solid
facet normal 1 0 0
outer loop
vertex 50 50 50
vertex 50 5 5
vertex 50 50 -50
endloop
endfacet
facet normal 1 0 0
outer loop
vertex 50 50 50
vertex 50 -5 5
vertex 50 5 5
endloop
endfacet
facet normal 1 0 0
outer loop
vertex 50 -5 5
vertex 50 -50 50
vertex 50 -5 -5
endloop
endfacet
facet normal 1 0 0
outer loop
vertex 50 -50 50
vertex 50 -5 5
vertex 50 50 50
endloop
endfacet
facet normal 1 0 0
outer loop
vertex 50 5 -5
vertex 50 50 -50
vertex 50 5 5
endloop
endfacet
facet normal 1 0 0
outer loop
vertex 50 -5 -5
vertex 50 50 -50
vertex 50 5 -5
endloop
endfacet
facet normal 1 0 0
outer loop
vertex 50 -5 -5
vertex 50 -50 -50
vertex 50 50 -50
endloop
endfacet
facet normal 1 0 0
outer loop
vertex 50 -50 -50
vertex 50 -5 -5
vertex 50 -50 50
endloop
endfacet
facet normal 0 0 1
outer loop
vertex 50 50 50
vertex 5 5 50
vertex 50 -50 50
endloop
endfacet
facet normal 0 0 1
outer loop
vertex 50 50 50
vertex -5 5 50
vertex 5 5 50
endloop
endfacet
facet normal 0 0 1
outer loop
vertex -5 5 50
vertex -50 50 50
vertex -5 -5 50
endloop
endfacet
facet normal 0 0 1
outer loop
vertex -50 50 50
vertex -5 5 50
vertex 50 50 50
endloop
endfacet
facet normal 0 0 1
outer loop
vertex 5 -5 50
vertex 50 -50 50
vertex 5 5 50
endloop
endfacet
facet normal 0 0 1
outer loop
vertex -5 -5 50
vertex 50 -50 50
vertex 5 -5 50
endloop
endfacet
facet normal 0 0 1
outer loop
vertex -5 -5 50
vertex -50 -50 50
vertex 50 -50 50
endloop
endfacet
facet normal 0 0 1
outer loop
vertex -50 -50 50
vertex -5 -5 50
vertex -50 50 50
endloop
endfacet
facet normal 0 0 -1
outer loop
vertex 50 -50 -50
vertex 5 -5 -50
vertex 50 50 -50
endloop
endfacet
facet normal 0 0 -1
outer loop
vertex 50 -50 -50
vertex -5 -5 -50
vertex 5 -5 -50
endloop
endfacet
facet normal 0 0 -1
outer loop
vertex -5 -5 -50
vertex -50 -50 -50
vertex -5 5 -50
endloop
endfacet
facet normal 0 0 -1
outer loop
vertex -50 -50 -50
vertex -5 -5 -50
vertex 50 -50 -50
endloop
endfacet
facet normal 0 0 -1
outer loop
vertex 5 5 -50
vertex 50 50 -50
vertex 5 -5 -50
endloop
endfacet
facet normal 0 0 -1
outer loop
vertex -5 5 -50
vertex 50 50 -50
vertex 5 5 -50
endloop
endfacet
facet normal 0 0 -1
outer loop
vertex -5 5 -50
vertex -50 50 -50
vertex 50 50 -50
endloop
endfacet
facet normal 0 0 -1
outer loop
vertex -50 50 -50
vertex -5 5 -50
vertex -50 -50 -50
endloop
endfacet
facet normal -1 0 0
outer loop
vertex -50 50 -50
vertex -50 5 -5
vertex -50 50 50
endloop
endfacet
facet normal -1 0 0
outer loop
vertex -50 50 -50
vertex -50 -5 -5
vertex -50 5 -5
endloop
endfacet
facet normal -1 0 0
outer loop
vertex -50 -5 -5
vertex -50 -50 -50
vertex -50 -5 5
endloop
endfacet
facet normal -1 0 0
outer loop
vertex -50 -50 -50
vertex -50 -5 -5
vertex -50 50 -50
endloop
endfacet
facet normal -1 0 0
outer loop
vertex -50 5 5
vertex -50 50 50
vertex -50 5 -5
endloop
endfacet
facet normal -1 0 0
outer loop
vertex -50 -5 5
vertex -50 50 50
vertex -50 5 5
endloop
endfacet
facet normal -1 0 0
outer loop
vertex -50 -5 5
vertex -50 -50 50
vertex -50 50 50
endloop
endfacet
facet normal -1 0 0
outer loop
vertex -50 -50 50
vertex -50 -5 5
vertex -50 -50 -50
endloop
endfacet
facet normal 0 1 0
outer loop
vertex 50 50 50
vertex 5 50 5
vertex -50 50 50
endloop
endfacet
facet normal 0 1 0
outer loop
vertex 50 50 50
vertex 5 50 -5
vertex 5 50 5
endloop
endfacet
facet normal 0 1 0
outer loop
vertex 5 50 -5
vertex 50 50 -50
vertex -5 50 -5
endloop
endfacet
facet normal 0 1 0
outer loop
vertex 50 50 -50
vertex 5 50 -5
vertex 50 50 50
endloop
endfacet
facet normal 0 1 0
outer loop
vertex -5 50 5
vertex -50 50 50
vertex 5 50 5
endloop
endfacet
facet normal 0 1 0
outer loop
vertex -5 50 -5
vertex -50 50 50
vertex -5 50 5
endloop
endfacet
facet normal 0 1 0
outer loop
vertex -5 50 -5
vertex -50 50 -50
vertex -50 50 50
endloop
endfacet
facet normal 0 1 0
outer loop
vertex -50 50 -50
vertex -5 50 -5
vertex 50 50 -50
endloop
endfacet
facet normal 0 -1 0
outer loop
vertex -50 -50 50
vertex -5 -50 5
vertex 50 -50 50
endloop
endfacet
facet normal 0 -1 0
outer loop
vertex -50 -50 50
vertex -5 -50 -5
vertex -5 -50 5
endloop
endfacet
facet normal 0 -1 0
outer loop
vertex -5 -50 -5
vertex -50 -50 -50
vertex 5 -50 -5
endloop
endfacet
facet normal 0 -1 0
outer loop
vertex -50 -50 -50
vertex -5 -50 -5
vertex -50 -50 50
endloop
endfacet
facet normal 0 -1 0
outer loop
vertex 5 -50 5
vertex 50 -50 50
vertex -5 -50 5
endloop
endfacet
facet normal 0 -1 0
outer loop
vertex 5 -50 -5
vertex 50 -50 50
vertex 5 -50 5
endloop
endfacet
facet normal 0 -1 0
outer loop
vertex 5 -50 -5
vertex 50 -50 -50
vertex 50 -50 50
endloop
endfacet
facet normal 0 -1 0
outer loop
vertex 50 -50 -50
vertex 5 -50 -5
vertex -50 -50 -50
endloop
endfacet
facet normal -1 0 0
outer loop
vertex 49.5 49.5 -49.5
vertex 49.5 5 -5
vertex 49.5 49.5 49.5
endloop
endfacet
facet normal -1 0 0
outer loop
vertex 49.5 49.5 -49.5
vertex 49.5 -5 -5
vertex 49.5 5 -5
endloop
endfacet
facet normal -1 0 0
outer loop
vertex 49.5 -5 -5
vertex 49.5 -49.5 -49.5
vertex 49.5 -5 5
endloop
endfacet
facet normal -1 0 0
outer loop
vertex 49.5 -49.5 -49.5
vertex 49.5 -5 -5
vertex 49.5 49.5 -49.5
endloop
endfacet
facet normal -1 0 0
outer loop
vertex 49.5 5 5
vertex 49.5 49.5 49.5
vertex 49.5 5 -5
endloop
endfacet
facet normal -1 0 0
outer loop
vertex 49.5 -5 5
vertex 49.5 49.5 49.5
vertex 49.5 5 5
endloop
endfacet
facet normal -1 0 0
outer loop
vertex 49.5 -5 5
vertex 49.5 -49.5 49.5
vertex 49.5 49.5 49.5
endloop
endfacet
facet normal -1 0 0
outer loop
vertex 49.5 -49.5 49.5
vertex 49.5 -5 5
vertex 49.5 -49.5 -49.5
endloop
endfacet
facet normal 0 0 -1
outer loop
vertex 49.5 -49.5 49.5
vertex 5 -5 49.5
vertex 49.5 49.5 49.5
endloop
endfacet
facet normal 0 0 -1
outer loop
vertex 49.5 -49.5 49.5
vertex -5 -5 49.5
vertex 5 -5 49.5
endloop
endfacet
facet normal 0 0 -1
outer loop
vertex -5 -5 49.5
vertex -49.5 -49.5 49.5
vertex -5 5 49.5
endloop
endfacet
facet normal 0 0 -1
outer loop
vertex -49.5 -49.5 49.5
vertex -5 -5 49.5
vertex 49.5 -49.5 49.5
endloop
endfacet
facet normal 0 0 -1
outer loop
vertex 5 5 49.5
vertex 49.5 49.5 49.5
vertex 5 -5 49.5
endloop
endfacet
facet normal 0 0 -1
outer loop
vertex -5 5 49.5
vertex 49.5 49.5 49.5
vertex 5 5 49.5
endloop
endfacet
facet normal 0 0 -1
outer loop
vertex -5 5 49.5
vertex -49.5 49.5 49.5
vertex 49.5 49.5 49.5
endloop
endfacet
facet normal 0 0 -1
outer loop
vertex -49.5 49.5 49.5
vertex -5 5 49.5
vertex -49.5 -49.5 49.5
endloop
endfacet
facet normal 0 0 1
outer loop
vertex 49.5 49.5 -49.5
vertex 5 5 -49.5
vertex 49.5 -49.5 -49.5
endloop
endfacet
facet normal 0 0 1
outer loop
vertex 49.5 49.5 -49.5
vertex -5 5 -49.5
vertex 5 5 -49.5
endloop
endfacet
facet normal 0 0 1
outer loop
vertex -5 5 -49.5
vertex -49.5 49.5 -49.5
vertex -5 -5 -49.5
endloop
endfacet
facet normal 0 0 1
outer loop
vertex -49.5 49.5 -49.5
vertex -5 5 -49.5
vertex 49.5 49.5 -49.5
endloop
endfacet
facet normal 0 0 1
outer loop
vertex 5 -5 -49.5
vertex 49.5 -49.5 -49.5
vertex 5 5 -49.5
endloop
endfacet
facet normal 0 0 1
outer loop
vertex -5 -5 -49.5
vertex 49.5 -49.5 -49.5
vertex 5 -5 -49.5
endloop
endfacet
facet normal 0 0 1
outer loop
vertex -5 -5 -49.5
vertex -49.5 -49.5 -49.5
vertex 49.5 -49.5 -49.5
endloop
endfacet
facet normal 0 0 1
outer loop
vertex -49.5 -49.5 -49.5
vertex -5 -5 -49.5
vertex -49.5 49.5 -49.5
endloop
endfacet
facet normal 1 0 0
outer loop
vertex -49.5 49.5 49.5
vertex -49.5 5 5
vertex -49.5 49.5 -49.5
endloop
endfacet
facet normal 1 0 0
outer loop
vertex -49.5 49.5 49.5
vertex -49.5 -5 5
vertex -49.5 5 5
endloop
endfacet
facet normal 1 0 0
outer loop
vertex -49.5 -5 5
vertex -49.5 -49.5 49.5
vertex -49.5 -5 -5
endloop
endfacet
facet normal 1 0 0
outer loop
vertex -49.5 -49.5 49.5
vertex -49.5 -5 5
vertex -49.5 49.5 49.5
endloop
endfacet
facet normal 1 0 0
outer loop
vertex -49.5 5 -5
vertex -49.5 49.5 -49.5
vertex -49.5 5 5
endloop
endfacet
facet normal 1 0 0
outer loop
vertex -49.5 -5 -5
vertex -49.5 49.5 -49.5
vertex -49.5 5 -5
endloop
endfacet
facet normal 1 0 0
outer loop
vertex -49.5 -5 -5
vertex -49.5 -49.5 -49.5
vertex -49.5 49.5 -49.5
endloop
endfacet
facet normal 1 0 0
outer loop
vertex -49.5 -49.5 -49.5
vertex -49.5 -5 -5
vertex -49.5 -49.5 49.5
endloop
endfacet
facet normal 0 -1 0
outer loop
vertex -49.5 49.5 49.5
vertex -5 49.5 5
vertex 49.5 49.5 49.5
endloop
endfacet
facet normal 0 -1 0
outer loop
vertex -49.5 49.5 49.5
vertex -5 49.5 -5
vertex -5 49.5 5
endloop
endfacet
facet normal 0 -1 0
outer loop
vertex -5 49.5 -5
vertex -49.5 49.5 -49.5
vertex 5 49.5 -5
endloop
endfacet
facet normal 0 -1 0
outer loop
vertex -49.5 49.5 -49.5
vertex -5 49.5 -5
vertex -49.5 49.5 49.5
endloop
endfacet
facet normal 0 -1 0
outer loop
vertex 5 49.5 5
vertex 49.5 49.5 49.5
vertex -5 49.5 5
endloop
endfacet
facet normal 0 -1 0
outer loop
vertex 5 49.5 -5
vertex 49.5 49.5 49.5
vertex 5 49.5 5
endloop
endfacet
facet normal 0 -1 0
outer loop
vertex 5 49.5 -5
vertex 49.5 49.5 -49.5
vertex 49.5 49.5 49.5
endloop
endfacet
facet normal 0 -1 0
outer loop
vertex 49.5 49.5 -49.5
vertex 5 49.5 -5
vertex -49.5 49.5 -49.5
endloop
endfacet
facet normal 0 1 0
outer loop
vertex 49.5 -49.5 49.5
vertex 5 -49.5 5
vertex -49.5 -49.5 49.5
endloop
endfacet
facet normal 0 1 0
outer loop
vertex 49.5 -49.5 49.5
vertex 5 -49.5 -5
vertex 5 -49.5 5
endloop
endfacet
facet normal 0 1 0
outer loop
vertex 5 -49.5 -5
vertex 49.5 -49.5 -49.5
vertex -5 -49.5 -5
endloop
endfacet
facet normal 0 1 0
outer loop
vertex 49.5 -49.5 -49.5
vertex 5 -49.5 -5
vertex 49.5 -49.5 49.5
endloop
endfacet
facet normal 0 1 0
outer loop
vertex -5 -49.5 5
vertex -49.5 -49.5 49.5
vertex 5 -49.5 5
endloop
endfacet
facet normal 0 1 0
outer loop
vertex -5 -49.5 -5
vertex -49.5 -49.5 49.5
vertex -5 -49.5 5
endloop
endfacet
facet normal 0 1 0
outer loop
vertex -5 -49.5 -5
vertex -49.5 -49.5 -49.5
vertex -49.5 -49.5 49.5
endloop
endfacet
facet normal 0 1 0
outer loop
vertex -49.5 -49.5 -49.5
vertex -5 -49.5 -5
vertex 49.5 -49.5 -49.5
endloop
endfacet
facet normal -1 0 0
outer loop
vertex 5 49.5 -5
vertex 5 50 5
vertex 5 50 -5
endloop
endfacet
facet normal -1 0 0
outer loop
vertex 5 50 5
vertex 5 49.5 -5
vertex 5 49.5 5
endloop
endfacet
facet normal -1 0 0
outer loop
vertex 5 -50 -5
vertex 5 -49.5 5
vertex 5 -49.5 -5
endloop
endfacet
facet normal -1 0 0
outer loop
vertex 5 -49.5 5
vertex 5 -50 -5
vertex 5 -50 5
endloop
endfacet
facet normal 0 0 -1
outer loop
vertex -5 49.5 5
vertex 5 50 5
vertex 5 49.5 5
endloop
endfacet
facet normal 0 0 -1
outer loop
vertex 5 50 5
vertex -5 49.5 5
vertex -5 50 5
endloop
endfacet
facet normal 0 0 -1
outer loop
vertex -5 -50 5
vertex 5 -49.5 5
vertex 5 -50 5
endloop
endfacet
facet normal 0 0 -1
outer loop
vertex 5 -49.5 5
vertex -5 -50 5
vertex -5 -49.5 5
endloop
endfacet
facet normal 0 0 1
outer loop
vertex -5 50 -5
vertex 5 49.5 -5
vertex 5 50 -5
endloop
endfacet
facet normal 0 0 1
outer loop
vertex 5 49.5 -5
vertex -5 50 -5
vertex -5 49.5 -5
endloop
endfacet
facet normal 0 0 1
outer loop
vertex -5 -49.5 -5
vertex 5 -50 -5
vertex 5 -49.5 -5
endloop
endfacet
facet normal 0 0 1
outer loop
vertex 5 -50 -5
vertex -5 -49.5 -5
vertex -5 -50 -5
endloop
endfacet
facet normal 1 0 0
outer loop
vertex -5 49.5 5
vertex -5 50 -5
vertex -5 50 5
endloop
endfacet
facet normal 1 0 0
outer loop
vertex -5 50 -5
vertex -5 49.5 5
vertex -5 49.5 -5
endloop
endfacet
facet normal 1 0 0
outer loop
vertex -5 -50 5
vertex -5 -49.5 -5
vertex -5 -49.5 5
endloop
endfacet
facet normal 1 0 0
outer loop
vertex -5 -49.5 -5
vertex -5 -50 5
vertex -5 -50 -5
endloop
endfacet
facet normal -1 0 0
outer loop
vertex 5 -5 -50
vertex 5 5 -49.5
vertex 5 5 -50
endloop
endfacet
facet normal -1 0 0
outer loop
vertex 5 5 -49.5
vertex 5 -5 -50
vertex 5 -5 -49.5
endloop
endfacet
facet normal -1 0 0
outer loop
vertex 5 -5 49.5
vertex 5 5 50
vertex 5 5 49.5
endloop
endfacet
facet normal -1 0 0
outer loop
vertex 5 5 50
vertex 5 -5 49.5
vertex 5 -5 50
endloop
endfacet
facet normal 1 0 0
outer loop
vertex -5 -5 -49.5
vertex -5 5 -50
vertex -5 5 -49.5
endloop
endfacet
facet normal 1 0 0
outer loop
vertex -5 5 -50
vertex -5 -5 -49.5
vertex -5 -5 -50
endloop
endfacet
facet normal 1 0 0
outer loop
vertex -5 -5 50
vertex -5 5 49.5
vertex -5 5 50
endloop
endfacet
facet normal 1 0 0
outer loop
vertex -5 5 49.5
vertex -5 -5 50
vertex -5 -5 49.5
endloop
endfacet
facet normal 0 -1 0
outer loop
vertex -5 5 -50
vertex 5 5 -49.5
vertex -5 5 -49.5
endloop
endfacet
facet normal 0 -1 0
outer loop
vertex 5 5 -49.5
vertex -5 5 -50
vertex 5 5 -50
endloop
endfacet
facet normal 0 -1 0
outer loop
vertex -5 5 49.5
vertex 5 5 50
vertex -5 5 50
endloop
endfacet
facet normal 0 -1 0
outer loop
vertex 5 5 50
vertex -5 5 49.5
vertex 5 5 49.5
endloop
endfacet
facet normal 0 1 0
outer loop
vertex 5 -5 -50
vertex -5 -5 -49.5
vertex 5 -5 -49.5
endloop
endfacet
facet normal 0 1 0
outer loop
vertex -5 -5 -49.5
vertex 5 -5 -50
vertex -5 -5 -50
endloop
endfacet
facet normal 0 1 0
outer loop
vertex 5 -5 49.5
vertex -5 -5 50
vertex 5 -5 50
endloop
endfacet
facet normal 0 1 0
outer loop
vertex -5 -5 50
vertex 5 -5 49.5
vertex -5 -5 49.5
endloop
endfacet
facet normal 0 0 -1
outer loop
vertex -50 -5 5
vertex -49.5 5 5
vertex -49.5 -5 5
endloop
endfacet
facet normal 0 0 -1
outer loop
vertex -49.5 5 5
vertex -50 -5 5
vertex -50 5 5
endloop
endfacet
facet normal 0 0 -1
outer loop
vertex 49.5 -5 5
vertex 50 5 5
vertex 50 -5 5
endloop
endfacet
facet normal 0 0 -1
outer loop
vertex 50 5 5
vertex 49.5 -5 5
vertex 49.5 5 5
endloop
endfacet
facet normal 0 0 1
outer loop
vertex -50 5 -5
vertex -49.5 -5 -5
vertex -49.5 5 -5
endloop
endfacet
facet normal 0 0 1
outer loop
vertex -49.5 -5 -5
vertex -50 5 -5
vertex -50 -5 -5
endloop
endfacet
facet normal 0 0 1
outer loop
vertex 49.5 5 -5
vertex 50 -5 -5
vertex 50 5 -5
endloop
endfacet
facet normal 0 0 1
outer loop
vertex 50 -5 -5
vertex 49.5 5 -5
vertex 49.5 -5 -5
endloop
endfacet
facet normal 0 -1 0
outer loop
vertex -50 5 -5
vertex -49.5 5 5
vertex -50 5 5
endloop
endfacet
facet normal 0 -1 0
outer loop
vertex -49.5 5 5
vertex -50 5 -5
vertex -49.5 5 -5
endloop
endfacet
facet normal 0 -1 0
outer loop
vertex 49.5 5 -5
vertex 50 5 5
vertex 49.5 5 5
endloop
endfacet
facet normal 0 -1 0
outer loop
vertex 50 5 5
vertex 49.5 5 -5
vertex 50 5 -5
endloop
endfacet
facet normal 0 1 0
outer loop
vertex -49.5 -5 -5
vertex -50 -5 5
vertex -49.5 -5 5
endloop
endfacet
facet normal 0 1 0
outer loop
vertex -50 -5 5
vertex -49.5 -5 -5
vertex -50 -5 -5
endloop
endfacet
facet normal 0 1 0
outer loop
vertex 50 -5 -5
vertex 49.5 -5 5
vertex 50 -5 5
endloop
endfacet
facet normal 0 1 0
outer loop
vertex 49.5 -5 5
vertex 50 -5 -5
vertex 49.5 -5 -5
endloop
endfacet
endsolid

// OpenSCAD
difference() {
	difference() {
		difference() {
		    difference() {
		        cube(100, center = true);
		        translate([0, 0, 0]) { cube(99, center = true); };
		    };
		    scale([0.1, 1.9, 0.1]) { cube(100, center = true); };
		};
	        scale([0.1, 0.1, 1.9]) { cube(100, center = true); };
	};
    	scale([1.9, 0.1, 0.1]) { cube(100, center = true); };
};
